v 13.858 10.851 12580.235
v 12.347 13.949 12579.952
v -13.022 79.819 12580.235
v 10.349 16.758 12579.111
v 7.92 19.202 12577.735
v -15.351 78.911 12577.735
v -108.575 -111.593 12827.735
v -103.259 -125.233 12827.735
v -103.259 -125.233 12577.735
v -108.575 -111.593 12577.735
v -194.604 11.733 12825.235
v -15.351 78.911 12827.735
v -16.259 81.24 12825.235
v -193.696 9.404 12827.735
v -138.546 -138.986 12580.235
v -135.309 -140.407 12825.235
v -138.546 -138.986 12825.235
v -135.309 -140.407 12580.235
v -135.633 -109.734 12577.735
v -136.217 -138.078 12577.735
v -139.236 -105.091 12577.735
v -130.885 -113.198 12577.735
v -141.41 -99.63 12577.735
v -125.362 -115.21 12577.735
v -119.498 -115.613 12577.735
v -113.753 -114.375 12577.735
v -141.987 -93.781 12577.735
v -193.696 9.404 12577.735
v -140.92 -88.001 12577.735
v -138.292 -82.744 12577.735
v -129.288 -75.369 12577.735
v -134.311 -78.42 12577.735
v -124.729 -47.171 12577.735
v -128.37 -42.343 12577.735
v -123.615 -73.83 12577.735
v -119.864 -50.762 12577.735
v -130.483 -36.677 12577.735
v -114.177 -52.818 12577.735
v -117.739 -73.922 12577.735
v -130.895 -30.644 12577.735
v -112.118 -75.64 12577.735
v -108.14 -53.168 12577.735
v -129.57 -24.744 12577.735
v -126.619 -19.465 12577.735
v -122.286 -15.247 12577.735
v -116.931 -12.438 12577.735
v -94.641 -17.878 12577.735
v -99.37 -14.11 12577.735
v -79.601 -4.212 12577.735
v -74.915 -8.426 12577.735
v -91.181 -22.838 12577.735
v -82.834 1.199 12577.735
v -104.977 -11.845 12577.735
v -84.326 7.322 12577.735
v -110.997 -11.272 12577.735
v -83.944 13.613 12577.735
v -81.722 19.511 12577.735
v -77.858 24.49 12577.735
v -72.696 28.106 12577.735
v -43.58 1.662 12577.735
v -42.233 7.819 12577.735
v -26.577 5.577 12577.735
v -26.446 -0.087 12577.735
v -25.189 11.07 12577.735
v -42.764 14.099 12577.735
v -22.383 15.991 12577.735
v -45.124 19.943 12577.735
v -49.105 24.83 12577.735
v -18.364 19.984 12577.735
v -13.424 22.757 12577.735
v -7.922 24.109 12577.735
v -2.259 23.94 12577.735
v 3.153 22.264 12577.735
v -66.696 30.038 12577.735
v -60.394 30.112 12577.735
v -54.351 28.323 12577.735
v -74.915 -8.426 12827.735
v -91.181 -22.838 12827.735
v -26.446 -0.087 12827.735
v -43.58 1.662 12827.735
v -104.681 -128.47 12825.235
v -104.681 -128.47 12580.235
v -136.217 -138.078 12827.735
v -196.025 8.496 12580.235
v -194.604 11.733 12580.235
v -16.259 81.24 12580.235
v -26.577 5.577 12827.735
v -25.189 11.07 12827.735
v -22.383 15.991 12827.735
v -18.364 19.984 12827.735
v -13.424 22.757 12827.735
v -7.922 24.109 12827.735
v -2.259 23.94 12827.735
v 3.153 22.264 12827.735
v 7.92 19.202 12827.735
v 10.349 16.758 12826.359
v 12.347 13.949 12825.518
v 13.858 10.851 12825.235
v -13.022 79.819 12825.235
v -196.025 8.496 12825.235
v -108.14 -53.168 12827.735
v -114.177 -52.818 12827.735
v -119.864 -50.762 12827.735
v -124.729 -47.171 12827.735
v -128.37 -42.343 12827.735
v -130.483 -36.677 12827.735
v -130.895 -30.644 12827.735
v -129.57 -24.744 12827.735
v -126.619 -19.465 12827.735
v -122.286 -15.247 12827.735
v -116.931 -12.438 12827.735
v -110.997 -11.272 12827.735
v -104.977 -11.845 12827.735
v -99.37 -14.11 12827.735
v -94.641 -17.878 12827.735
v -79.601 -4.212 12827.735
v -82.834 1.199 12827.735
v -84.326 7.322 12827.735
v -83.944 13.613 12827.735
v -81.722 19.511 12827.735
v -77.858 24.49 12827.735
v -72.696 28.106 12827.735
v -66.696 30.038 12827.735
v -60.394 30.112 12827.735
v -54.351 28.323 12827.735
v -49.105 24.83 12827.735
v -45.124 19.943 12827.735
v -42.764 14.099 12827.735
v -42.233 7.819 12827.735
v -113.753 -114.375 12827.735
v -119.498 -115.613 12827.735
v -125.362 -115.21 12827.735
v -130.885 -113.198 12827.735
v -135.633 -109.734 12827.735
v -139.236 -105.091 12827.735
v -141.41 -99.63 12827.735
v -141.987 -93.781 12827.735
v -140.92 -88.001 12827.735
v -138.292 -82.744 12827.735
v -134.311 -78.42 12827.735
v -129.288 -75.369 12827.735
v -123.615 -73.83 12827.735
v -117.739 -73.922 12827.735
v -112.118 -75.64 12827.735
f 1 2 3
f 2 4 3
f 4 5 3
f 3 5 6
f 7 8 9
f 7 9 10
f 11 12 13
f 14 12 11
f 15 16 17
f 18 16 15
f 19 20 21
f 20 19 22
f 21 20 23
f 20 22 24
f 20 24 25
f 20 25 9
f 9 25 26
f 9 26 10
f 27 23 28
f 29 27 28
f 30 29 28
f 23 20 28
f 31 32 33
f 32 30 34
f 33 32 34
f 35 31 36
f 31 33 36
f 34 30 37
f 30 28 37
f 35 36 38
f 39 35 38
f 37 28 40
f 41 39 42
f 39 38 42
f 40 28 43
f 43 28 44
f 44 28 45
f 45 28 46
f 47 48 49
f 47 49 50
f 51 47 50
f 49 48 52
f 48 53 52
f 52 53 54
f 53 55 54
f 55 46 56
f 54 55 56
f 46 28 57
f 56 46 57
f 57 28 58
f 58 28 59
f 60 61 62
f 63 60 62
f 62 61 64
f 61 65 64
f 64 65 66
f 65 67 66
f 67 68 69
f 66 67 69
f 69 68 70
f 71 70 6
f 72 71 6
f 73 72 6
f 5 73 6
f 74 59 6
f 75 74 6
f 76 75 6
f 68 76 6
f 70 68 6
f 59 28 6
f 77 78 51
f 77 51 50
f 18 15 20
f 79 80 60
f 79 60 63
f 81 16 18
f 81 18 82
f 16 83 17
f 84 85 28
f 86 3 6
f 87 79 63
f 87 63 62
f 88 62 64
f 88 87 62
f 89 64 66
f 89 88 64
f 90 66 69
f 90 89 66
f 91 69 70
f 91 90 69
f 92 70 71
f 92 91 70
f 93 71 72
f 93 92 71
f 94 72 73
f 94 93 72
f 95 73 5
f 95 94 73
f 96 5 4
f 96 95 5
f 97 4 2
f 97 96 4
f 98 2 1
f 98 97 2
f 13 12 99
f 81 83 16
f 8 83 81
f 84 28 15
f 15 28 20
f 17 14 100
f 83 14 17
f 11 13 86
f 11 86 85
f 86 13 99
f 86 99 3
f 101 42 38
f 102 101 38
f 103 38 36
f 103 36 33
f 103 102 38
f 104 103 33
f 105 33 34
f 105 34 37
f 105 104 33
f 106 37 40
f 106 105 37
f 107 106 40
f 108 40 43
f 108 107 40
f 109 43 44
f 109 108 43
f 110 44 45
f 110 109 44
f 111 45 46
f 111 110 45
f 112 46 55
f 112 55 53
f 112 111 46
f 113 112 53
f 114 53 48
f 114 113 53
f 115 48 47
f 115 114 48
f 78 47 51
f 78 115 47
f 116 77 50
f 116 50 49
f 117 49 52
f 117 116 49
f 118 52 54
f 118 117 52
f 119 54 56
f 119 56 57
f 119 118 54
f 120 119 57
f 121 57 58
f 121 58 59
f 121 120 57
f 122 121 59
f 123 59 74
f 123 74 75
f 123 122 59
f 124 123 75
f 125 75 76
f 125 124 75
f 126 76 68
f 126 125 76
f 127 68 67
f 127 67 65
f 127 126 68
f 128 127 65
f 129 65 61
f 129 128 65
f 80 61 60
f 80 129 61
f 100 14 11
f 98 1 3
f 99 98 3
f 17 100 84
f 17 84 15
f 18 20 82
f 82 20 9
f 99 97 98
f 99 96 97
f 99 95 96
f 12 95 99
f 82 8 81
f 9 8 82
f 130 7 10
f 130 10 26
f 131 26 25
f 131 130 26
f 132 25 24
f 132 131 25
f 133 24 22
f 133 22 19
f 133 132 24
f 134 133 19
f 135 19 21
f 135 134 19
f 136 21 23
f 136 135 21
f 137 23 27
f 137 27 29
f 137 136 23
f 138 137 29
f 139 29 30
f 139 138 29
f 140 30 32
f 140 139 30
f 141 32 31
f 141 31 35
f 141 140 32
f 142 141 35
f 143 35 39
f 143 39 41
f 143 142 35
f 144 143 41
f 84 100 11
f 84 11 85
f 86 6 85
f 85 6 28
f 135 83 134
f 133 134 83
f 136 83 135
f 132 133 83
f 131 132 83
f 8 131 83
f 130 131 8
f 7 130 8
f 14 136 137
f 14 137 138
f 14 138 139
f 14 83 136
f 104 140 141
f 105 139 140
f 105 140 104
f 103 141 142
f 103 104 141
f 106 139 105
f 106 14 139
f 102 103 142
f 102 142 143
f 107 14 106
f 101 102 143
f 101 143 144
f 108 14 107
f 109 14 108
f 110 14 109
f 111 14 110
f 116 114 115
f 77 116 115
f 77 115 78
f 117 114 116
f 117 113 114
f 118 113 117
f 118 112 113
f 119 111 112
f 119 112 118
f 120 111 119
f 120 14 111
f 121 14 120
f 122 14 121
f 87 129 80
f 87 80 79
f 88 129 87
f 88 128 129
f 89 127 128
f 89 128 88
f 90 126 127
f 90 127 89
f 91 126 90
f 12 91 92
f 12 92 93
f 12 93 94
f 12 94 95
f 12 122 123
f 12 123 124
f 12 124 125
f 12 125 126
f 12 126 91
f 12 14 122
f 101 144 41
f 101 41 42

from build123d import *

# Parameters (mm, degrees)
EXTRUDE_2_DEPTH = 250
CHAMFER_1_SIZE  = 2.5


with BuildPart() as part:
    # 草圖1 → 填料-伸長2 (new body)
    with BuildSketch(Plane(origin=(1e-09, -1e-09, 12827.735128457), x_dir=(1, 0, 0), z_dir=(0, 0, 1))):
        with BuildLine():
            Line((-112.117770632, -75.640230505), (-108.139732902, -53.167558993))
            ThreePointArc((-108.139732902, -53.167558993), (-128.285417164, -21.997695969), (-91.181469021, -22.837926636))
            Line((-91.181469021, -22.837926636), (-74.915186503, -8.426224475))
            ThreePointArc((-74.915186503, -8.426224475), (-69.768626313, 29.297285814), (-43.57987489, 1.662170304))
            Line((-43.57987489, 1.662170304), (-26.446012397, -0.086903016))
            ThreePointArc((-26.446012397, -0.086903016), (-11.209248537, 23.49241234), (13.857582965, 10.851326786))
            Line((13.857582965, 10.851326786), (-13.929514572, 82.148324057))
            Line((-13.929514572, 82.148324057), (-196.933065463, 10.825018546))
            Line((-196.933065463, 10.825018546), (-137.638404215, -141.315063571))
            Line((-137.638404215, -141.315063571), (-102.351415407, -127.562408658))
            Line((-102.351415407, -127.562408658), (-108.57535624, -111.5928281))
            ThreePointArc((-108.57535624, -111.5928281), (-141.904281803, -96.725915639), (-112.117770632, -75.640230505))
        make_face()
    extrude(amount=-EXTRUDE_2_DEPTH)

    # 導角1
    chamfer_1_edges = [part.edges().sort_by_distance(p)[0] for p in [
        (-119.99490981, -134.438736116, 12827.735128457),
        (-167.285734839, -65.245022514, 12827.735128457),
        (-105.431290017, 46.4866713, 12827.735128457),
        (-0.035965803, 46.49982542, 12827.735128457),
        (-0.035965803, 46.49982542, 12577.735128457),
        (-102.351415406, -127.562408659, 12702.735128457),
        (-137.638404215, -141.315063573, 12702.735128457),
        (-196.933065463, 10.825018545, 12702.735128457),
        (-13.929514572, 82.148324055, 12702.735128457),
        (-105.431290017, 46.4866713, 12577.735128457),
        (-167.285734839, -65.245022514, 12577.735128457),
        (-119.99490981, -134.438736116, 12577.735128457),
    ]]
    chamfer(chamfer_1_edges, length=CHAMFER_1_SIZE)


solid = part.part
